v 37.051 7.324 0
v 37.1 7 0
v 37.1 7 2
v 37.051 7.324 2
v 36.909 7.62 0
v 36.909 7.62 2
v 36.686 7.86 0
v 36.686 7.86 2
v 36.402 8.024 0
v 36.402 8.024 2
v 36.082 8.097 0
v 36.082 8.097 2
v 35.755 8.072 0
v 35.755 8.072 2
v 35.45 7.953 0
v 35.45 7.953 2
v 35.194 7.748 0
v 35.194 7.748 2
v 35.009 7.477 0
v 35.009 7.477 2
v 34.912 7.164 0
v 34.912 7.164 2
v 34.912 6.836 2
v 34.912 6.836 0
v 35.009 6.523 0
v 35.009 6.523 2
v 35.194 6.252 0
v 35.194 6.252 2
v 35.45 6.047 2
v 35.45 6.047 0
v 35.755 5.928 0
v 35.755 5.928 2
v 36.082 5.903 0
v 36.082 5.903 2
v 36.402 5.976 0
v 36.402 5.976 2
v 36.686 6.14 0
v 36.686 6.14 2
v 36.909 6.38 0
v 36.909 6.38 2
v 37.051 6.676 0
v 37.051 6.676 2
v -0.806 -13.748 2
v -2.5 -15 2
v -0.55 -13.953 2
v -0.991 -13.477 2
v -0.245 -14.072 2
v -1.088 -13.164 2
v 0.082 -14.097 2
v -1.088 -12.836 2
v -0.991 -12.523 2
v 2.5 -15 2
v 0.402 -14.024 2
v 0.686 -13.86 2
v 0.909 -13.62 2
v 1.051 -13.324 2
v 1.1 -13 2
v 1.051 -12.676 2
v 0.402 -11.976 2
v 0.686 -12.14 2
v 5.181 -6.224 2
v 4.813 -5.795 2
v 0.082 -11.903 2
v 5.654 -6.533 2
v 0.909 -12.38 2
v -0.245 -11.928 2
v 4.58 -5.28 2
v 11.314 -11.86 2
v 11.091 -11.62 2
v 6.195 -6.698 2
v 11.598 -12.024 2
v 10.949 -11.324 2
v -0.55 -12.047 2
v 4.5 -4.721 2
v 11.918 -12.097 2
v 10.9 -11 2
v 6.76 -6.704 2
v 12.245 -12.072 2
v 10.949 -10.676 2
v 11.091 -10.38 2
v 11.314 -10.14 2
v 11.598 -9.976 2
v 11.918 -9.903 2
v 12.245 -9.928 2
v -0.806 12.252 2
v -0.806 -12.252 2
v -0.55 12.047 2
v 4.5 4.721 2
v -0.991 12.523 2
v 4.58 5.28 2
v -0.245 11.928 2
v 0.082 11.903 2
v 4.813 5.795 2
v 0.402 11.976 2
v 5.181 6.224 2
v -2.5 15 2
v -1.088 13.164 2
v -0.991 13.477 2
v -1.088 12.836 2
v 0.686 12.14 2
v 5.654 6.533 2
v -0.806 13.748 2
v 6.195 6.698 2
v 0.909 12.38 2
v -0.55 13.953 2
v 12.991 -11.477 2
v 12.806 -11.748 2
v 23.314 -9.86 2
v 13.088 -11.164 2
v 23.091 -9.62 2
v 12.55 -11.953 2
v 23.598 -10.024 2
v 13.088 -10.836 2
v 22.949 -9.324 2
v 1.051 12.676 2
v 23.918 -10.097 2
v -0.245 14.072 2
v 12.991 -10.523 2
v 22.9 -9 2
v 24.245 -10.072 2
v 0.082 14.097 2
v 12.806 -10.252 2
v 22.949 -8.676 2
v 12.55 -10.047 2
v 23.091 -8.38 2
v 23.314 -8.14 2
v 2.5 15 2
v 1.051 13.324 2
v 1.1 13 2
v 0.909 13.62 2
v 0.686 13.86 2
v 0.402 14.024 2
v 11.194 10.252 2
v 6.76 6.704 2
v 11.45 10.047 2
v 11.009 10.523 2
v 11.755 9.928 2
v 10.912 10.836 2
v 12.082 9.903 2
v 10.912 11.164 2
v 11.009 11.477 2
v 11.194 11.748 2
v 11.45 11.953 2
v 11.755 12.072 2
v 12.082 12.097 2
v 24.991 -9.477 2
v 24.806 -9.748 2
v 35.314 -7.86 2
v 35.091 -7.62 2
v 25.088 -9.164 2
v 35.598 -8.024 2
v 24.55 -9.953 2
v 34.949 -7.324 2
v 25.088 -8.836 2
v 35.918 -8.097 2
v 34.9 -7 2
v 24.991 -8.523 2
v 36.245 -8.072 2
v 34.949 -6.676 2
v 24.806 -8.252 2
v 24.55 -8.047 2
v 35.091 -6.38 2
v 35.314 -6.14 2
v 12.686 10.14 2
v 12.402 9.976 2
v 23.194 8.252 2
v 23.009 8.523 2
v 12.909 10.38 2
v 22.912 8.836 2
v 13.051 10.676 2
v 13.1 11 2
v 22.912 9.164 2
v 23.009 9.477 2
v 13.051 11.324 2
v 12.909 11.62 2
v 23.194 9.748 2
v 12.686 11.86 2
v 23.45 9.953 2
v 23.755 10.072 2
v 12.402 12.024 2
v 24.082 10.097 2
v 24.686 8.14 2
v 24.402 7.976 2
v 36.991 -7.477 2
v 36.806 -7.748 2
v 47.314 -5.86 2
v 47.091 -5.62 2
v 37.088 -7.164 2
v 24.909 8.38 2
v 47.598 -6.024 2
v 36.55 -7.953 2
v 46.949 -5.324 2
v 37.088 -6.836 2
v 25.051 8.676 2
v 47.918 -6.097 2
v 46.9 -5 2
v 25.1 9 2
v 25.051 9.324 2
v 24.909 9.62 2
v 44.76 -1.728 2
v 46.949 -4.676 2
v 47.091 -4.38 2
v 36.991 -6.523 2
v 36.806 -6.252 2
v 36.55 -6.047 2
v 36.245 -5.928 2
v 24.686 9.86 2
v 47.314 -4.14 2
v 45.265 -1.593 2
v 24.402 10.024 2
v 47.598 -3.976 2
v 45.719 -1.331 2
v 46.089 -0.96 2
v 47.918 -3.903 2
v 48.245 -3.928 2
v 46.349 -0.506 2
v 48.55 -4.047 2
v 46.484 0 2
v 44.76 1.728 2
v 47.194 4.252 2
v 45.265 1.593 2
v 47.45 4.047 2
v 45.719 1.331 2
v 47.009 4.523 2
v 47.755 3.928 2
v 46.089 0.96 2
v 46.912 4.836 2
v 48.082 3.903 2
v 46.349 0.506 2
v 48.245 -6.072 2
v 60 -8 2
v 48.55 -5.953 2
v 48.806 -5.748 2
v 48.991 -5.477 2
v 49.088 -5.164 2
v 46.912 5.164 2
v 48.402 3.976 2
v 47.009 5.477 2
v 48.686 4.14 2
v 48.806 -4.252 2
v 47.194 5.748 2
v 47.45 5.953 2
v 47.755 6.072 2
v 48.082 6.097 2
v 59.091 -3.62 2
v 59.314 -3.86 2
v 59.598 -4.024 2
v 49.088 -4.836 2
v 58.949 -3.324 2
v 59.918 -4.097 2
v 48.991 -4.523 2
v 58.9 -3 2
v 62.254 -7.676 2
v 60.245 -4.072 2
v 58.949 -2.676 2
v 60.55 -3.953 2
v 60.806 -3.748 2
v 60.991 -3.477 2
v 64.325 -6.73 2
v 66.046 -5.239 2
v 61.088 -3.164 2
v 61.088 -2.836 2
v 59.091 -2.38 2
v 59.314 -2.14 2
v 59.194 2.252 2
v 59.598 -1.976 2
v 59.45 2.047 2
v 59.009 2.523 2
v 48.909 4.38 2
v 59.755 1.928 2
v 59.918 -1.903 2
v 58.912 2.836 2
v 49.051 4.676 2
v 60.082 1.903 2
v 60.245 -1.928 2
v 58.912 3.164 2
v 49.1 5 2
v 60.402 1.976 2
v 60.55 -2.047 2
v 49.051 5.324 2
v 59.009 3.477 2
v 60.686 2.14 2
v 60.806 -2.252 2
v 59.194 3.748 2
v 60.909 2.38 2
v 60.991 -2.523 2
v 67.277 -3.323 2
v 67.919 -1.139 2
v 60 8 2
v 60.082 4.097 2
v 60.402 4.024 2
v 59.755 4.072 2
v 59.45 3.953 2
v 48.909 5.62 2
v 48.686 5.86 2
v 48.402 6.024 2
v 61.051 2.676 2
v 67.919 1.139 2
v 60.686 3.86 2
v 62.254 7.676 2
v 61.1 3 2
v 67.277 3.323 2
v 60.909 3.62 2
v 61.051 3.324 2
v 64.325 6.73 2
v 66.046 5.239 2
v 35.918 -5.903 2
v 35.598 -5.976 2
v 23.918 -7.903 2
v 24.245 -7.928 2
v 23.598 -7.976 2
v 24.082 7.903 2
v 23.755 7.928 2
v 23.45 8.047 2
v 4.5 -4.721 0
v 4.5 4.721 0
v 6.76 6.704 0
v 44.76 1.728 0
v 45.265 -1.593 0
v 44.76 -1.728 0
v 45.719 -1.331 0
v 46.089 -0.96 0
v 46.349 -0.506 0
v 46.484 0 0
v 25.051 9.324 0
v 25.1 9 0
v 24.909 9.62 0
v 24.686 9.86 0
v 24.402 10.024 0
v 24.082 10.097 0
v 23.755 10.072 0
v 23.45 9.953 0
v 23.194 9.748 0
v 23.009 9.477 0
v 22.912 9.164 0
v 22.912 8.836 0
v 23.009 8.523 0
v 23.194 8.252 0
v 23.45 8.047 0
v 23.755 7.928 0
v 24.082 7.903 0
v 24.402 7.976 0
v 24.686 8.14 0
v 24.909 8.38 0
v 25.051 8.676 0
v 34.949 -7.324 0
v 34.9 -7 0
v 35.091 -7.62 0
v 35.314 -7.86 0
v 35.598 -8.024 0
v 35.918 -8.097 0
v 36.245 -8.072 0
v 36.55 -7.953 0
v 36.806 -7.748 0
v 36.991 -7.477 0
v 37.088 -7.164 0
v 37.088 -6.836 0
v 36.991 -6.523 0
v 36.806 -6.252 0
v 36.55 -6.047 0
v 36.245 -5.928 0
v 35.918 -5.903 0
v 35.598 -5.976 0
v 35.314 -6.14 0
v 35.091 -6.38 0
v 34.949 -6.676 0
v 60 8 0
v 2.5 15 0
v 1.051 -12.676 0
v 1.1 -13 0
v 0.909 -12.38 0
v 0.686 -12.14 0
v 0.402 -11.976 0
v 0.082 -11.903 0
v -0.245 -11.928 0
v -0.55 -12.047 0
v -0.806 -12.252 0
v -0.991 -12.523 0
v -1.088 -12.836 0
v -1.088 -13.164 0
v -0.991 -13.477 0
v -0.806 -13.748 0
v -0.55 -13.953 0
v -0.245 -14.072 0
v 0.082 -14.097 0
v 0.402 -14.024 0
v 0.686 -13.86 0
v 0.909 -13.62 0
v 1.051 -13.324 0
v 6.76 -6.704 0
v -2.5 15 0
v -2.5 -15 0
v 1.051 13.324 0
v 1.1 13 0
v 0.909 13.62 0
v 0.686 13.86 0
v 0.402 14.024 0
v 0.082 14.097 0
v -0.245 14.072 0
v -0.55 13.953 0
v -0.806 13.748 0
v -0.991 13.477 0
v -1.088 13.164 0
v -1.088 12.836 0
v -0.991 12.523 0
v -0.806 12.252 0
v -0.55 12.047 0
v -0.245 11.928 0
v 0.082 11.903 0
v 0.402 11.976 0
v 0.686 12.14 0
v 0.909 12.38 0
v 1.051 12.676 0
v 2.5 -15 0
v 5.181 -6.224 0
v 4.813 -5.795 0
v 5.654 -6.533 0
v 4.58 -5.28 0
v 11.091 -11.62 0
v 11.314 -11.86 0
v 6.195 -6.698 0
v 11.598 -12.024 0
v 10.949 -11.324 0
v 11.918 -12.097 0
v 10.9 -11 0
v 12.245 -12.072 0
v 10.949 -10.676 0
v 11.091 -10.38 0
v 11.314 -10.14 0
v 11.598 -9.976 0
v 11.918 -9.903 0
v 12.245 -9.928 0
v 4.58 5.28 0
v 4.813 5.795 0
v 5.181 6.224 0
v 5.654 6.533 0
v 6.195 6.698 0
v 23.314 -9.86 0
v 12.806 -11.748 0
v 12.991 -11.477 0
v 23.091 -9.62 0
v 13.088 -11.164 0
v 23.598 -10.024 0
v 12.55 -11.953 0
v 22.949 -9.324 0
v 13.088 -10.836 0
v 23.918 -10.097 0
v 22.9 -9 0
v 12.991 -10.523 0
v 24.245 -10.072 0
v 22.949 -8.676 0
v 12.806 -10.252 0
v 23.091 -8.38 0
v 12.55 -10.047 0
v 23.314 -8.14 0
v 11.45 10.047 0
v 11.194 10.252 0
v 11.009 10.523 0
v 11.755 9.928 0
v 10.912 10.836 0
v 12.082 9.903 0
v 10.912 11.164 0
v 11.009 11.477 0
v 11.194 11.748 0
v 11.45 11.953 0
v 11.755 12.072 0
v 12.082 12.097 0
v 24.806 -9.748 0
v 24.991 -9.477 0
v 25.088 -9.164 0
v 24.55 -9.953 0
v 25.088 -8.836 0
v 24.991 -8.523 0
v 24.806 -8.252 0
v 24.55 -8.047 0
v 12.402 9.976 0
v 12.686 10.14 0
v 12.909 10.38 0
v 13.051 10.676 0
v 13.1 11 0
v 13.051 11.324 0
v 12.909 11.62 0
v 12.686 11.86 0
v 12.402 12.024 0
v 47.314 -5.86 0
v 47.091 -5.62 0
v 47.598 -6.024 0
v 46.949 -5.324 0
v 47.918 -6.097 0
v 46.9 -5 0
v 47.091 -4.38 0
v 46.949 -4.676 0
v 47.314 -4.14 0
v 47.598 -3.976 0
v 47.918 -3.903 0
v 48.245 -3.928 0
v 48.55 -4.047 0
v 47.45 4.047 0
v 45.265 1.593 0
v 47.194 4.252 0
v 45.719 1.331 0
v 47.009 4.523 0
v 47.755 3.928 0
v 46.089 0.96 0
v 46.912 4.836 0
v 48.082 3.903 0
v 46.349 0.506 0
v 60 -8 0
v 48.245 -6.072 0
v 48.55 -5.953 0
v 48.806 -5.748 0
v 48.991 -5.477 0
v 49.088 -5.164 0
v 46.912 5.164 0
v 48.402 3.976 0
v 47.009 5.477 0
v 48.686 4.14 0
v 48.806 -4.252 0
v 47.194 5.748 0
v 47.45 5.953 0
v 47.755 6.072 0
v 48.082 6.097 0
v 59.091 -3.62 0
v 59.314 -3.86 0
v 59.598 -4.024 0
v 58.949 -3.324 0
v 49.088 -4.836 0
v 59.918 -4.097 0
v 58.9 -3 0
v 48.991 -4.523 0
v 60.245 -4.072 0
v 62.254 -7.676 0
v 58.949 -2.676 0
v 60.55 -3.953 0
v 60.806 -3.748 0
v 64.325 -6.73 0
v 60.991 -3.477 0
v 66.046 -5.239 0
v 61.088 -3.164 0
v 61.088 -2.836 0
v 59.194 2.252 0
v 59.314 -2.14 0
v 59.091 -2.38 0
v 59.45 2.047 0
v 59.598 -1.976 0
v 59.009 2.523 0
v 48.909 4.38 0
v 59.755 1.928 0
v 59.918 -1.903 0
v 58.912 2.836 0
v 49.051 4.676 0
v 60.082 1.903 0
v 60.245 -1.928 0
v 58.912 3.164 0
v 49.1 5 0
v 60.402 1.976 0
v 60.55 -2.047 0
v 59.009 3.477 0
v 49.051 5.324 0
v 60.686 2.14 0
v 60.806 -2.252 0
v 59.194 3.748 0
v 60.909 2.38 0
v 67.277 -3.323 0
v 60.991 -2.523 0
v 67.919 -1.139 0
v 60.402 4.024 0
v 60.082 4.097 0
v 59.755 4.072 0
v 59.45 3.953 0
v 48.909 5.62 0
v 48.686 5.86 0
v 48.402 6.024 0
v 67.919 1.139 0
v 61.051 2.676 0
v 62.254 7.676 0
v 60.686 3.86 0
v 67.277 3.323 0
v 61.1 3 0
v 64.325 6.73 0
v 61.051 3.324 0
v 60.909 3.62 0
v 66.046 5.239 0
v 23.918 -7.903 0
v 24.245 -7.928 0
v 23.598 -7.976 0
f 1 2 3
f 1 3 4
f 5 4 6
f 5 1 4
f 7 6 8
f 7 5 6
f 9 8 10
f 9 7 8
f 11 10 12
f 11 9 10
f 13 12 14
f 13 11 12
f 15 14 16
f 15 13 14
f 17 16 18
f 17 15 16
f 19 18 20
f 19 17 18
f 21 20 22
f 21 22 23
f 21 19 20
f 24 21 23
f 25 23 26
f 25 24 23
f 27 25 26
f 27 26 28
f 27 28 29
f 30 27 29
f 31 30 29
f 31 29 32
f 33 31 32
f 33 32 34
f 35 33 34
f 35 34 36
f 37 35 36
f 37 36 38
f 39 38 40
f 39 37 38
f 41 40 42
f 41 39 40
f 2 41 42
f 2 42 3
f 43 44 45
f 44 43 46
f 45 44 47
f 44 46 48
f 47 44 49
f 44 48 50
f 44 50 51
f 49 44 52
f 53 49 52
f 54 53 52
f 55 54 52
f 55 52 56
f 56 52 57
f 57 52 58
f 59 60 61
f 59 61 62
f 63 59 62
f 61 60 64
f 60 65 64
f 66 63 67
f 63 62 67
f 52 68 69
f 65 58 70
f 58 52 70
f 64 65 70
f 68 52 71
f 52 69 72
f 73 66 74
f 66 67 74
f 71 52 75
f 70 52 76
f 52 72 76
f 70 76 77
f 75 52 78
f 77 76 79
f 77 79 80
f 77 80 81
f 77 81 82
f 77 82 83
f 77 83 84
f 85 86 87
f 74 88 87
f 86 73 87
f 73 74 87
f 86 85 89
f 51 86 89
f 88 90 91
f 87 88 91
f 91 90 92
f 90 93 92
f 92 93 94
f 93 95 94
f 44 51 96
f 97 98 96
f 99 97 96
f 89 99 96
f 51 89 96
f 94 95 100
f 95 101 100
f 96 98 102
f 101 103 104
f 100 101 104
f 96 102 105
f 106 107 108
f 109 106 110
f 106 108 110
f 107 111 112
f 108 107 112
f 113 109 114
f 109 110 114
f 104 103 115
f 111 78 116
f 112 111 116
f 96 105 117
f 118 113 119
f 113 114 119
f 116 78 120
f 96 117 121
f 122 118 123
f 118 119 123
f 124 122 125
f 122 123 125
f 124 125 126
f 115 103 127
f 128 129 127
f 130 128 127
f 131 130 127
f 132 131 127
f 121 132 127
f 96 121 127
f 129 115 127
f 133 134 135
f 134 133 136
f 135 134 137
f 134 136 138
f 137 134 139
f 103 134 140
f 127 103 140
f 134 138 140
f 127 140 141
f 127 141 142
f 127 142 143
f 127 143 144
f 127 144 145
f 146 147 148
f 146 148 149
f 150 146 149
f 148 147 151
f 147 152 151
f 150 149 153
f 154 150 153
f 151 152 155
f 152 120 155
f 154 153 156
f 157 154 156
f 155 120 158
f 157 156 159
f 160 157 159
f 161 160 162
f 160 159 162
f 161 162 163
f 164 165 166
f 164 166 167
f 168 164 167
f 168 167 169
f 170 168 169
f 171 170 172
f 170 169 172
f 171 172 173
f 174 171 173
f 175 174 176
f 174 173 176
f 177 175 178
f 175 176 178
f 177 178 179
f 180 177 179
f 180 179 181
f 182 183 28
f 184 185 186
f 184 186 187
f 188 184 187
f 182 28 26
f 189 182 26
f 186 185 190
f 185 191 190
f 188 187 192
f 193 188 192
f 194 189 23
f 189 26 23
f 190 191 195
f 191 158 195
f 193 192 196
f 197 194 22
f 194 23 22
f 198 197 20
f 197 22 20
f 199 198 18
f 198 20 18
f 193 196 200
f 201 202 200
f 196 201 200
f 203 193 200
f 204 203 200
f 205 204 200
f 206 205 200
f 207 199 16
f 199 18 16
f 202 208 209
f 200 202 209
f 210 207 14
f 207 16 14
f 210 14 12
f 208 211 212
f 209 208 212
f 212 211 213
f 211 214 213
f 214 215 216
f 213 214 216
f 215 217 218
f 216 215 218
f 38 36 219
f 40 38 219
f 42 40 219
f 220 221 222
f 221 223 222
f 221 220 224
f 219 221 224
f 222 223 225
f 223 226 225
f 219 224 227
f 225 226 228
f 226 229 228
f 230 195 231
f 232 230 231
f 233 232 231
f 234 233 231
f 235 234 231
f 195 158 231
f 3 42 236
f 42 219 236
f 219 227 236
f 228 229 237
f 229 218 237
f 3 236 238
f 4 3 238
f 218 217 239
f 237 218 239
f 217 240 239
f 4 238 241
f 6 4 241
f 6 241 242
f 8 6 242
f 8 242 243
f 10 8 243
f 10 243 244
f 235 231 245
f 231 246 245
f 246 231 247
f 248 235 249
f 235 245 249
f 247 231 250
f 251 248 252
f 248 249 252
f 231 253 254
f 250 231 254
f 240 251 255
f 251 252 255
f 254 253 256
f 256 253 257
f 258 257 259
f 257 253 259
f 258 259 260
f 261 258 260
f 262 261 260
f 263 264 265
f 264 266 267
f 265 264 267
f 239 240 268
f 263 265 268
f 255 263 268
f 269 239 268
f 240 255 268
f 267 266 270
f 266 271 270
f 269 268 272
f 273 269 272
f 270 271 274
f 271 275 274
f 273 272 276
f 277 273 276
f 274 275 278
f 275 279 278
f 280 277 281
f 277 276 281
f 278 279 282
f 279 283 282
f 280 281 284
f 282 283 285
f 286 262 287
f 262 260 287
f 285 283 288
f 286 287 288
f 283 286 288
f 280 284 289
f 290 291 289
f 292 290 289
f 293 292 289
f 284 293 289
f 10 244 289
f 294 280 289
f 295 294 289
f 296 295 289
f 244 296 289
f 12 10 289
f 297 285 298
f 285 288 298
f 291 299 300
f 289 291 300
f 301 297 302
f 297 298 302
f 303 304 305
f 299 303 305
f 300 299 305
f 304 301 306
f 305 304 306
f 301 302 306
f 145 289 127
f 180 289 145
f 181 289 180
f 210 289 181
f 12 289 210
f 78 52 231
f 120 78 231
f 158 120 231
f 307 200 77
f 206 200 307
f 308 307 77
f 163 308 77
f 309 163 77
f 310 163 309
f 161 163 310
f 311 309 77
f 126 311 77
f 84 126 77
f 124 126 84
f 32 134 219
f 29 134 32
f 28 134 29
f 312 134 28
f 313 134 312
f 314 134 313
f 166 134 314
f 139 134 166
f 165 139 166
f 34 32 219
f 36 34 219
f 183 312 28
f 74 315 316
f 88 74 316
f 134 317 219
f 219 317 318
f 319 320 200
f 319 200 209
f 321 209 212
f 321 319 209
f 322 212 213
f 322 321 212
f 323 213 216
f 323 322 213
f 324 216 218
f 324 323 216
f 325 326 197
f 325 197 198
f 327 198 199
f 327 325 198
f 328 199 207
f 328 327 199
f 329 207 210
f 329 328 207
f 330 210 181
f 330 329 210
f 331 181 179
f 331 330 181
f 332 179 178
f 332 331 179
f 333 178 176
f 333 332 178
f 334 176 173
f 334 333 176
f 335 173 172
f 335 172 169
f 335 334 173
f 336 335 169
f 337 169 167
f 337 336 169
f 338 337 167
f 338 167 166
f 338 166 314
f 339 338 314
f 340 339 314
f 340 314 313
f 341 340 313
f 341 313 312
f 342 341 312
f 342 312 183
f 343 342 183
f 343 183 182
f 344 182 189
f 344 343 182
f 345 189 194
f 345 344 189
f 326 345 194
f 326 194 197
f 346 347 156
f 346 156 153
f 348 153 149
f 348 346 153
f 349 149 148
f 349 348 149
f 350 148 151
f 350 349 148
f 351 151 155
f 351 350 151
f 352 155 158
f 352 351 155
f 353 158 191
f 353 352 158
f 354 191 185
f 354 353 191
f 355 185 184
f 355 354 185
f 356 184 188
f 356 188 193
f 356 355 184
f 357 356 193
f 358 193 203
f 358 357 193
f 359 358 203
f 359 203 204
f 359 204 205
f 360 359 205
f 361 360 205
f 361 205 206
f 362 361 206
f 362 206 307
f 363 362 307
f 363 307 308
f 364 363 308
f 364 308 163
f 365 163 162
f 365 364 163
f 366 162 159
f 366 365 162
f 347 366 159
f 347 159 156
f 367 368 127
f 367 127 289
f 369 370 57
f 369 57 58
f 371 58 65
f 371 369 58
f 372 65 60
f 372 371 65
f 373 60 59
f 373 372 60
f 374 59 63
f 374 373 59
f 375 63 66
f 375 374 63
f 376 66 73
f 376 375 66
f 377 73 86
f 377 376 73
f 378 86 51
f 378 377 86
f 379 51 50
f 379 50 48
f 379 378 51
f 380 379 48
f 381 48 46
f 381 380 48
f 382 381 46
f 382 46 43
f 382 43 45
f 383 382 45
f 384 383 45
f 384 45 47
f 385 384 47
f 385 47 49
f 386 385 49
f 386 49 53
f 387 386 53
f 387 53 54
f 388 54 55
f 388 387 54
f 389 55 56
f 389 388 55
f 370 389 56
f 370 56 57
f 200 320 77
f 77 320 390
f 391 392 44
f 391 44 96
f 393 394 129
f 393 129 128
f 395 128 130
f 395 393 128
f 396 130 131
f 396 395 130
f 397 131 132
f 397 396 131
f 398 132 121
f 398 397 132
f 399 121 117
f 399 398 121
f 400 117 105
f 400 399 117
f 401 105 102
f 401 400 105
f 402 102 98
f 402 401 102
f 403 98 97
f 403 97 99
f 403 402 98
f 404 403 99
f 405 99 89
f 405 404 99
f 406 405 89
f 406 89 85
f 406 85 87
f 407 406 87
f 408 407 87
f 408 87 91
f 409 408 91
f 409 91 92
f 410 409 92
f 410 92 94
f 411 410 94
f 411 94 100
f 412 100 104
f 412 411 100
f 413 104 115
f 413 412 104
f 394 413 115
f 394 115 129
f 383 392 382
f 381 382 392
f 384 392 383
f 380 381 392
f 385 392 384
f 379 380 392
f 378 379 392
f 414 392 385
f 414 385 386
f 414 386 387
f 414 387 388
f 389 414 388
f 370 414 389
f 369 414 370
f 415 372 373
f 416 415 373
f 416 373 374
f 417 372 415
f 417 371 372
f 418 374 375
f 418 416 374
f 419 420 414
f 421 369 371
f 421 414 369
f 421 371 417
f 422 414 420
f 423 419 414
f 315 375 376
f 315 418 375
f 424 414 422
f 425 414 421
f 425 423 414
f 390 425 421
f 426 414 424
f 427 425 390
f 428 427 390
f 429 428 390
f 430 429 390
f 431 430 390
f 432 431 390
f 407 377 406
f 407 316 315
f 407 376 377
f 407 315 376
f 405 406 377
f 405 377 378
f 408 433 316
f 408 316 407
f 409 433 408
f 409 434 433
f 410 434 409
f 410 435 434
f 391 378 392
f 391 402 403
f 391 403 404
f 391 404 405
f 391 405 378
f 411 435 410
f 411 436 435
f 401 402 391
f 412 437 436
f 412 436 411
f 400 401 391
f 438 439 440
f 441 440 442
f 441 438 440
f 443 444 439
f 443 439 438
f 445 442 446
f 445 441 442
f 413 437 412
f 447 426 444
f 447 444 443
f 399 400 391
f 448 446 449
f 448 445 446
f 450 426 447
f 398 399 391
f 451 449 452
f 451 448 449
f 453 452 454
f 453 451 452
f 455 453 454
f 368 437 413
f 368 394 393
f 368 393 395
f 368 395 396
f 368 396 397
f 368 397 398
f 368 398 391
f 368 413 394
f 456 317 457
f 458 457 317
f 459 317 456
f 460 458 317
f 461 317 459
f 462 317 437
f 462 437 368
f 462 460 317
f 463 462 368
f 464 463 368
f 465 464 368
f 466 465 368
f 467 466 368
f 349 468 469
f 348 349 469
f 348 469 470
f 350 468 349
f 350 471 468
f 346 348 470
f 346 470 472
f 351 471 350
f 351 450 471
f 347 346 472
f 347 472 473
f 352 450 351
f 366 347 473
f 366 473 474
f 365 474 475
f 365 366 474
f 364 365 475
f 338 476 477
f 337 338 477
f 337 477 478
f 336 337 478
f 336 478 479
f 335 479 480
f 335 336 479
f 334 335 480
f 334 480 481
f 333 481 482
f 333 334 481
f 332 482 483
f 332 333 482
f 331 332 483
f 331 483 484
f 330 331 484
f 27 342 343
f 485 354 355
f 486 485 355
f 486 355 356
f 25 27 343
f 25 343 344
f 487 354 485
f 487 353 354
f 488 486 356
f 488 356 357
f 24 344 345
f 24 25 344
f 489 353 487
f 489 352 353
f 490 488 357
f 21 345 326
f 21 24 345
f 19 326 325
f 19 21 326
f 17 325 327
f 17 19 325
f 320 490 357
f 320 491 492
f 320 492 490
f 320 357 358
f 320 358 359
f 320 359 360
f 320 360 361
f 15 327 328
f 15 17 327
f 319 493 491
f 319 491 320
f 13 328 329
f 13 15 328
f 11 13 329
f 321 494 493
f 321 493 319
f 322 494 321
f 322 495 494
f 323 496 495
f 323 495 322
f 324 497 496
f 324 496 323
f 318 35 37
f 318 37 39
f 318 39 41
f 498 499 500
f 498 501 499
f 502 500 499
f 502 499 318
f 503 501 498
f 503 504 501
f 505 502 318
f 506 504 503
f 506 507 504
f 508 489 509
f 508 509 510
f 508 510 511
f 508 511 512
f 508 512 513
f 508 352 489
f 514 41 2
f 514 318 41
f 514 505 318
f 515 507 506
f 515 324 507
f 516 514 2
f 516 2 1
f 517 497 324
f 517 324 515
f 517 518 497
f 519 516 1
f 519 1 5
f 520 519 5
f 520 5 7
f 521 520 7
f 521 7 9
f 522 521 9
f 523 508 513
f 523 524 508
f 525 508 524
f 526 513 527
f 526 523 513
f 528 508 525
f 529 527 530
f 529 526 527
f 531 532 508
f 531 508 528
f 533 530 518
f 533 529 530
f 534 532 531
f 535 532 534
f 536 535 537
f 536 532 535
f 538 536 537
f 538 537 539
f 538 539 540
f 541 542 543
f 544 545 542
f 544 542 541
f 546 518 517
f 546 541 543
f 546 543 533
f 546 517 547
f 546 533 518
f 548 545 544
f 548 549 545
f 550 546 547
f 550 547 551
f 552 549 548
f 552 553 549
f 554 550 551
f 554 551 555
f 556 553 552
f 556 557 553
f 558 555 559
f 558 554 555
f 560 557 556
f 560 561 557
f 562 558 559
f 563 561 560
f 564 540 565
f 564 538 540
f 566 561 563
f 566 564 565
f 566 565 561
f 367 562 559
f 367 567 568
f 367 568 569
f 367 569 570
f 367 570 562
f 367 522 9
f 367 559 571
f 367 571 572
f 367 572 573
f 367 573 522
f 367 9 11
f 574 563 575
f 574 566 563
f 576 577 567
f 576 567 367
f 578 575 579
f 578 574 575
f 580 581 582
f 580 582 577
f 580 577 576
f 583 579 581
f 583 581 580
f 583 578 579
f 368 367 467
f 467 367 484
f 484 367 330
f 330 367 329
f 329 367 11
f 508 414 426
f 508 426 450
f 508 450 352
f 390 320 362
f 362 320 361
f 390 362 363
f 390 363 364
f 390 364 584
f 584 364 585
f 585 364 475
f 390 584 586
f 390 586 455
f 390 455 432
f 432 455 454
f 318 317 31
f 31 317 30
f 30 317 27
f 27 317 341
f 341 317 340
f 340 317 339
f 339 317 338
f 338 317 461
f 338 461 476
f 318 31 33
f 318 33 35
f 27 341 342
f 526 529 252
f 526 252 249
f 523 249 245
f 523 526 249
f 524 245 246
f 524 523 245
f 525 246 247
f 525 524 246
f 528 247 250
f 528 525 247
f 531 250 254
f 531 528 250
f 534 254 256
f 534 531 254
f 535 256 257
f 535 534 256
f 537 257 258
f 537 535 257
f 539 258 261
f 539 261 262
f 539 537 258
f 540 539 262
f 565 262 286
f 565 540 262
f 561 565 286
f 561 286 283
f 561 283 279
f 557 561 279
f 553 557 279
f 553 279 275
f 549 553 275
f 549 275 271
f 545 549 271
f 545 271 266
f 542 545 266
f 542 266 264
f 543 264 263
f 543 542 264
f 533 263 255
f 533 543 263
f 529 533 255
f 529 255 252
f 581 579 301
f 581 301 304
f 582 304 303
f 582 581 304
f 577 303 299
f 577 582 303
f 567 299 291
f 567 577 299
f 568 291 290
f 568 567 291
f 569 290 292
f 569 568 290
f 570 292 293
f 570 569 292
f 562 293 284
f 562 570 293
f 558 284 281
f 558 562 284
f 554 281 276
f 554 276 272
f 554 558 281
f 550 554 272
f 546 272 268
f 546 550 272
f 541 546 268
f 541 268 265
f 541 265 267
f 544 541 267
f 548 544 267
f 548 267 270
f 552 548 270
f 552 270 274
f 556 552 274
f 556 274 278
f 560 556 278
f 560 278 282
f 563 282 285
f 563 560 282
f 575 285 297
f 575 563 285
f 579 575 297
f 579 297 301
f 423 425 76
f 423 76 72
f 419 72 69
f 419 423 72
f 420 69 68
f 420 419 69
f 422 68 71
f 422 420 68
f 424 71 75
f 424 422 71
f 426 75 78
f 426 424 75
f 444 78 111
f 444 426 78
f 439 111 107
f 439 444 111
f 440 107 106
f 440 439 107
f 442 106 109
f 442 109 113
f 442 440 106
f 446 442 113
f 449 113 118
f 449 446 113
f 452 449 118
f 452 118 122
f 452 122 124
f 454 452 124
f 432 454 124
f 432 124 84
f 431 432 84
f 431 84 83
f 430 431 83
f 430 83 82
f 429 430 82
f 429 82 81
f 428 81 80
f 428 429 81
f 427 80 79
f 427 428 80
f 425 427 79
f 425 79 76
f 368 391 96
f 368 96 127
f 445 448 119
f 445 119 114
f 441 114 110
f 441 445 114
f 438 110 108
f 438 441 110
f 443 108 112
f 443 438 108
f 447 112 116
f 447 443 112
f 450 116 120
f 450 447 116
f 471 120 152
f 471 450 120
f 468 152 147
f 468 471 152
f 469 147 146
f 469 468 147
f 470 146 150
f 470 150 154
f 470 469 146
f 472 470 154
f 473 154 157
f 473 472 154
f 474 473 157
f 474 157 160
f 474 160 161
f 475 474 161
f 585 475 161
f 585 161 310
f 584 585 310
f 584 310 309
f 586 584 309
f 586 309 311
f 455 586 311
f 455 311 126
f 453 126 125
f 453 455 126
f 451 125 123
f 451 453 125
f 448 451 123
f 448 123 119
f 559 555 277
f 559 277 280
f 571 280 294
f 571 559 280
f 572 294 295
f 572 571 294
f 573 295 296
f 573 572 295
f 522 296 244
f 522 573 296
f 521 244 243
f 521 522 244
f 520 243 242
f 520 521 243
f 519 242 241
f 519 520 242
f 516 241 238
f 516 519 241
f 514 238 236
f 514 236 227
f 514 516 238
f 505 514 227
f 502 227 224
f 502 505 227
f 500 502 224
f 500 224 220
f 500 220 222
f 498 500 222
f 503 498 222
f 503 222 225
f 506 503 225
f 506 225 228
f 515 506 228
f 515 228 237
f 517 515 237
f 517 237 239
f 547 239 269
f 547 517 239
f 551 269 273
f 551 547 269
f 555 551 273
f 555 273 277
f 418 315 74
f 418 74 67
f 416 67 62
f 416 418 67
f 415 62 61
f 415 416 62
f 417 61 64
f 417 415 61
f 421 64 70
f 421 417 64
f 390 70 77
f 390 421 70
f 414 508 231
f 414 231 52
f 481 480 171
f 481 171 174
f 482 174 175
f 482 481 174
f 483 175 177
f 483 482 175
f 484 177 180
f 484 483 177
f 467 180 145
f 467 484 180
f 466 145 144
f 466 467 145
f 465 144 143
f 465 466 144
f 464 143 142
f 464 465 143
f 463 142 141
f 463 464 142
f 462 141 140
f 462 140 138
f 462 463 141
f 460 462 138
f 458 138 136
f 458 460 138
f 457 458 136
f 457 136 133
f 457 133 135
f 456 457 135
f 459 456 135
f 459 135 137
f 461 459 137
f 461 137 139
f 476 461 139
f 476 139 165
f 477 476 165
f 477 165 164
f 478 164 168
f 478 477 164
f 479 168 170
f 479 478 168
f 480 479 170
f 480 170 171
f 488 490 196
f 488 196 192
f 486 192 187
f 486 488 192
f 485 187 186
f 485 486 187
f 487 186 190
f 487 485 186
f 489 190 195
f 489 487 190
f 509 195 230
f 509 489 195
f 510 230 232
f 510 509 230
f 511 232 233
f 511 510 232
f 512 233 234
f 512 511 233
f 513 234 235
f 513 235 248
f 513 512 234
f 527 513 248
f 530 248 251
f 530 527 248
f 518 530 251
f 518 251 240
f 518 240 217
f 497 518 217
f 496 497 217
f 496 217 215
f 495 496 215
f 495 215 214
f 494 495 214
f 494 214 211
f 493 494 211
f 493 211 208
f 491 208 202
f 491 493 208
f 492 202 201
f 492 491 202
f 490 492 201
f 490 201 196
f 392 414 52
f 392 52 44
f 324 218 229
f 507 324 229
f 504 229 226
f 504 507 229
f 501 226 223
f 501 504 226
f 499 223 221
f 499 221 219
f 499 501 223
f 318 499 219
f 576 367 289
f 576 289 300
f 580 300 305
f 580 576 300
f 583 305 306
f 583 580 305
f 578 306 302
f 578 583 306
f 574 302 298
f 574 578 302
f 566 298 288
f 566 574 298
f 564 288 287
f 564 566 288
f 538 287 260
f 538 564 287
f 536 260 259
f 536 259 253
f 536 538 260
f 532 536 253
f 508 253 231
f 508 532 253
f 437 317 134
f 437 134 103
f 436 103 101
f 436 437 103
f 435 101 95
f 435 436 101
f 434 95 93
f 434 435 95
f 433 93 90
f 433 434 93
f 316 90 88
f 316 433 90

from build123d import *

# Parameters (mm, degrees)
SKETCH_1_R      = 1.1
EXTRUDE_1_DEPTH = 2
FILLET_1_R      = 2


with BuildPart() as part:
    # 草圖1 → 填料-伸長1 (new body)
    with BuildSketch(Plane.XY):
        with BuildLine():
            Line((2.5, 15), (60, 8))
            ThreePointArc((60, 8), (68, 0), (60, -8))
            Line((60, -8), (2.5, -15))
            Line((2.5, -15), (-2.5, -15))
            Line((-2.5, -15), (-2.5, 15))
            Line((-2.5, 15), (2.5, 15))
        make_face()
        with Locations((0, 13)):
            Circle(SKETCH_1_R, mode=Mode.SUBTRACT)
        with Locations((0, -13)):
            Circle(SKETCH_1_R, mode=Mode.SUBTRACT)
        with Locations((12, 11)):
            Circle(SKETCH_1_R, mode=Mode.SUBTRACT)
        with Locations((24, 9)):
            Circle(SKETCH_1_R, mode=Mode.SUBTRACT)
        with Locations((36, 7)):
            Circle(SKETCH_1_R, mode=Mode.SUBTRACT)
        with Locations((48, 5)):
            Circle(SKETCH_1_R, mode=Mode.SUBTRACT)
        with Locations((60, 3)):
            Circle(SKETCH_1_R, mode=Mode.SUBTRACT)
        with Locations(Location((60, -3, 0), (0, 0, 180))):
            Circle(SKETCH_1_R, mode=Mode.SUBTRACT)
        with Locations(Location((48, -5, 0), (0, 0, 180))):
            Circle(SKETCH_1_R, mode=Mode.SUBTRACT)
        with Locations(Location((36, -7, 0), (0, 0, 180))):
            Circle(SKETCH_1_R, mode=Mode.SUBTRACT)
        with Locations(Location((24, -9, 0), (0, 0, 180))):
            Circle(SKETCH_1_R, mode=Mode.SUBTRACT)
        with Locations(Location((12, -11, 0), (0, 0, 180))):
            Circle(SKETCH_1_R, mode=Mode.SUBTRACT)
        Polygon((4.5, 0), (4.5, 7), (46.5, 1.5), (46.5, -1.5), (4.5, -7), align=None, mode=Mode.SUBTRACT)
    extrude(amount=EXTRUDE_1_DEPTH)

    # 圓角1
    # the kernel refuses this fillet: 2 mm, written as the material it adds along each edge
    with BuildSketch(Plane(origin=(46.5, -1.5, 0), x_dir=(0, 1, 0), z_dir=(0, 0, 1)), Plane(origin=(46.5, 1.5, 0), x_dir=(-0.9915344613221523, 0.12984379850647185, 0), z_dir=(0, 0, 1))) as fillet_1_piece_1:
        with BuildLine():
            CenterArc((FILLET_1_R * 0.877585434936, FILLET_1_R), FILLET_1_R, 187.460566126, 82.539433874)
            Line((-FILLET_1_R * 0.113949026386, FILLET_1_R * 0.870156201494), (0, 0))
            Line((0, 0), (FILLET_1_R * 0.877585434936, 0))
        make_face()
    extrude(amount=2)
    with BuildSketch(Plane(origin=(4.5, -7, 0), x_dir=(0, 1, 0), z_dir=(0, 0, 1))) as fillet_1_piece_2:
        with BuildLine():
            CenterArc((FILLET_1_R * 1.13949019684, -FILLET_1_R), FILLET_1_R, 90, 97.460566126)
            Line((FILLET_1_R * 0.147955735519, -FILLET_1_R * 1.12984379851), (0, 0))
            Line((0, 0), (FILLET_1_R * 1.13949019684, 0))
        make_face()
    extrude(amount=2)
    with BuildSketch(Plane(origin=(4.5, 7, 0), x_dir=(0, -1, 0), z_dir=(0, 0, 1))) as fillet_1_piece_3:
        with BuildLine():
            CenterArc((FILLET_1_R * 1.13949019684, FILLET_1_R), FILLET_1_R, 172.539433874, 97.460566126)
            Line((FILLET_1_R * 0.147955735519, FILLET_1_R * 1.12984379851), (0, 0))
            Line((0, 0), (FILLET_1_R * 1.13949019684, 0))
        make_face()
    extrude(amount=2)


solid = part.part
